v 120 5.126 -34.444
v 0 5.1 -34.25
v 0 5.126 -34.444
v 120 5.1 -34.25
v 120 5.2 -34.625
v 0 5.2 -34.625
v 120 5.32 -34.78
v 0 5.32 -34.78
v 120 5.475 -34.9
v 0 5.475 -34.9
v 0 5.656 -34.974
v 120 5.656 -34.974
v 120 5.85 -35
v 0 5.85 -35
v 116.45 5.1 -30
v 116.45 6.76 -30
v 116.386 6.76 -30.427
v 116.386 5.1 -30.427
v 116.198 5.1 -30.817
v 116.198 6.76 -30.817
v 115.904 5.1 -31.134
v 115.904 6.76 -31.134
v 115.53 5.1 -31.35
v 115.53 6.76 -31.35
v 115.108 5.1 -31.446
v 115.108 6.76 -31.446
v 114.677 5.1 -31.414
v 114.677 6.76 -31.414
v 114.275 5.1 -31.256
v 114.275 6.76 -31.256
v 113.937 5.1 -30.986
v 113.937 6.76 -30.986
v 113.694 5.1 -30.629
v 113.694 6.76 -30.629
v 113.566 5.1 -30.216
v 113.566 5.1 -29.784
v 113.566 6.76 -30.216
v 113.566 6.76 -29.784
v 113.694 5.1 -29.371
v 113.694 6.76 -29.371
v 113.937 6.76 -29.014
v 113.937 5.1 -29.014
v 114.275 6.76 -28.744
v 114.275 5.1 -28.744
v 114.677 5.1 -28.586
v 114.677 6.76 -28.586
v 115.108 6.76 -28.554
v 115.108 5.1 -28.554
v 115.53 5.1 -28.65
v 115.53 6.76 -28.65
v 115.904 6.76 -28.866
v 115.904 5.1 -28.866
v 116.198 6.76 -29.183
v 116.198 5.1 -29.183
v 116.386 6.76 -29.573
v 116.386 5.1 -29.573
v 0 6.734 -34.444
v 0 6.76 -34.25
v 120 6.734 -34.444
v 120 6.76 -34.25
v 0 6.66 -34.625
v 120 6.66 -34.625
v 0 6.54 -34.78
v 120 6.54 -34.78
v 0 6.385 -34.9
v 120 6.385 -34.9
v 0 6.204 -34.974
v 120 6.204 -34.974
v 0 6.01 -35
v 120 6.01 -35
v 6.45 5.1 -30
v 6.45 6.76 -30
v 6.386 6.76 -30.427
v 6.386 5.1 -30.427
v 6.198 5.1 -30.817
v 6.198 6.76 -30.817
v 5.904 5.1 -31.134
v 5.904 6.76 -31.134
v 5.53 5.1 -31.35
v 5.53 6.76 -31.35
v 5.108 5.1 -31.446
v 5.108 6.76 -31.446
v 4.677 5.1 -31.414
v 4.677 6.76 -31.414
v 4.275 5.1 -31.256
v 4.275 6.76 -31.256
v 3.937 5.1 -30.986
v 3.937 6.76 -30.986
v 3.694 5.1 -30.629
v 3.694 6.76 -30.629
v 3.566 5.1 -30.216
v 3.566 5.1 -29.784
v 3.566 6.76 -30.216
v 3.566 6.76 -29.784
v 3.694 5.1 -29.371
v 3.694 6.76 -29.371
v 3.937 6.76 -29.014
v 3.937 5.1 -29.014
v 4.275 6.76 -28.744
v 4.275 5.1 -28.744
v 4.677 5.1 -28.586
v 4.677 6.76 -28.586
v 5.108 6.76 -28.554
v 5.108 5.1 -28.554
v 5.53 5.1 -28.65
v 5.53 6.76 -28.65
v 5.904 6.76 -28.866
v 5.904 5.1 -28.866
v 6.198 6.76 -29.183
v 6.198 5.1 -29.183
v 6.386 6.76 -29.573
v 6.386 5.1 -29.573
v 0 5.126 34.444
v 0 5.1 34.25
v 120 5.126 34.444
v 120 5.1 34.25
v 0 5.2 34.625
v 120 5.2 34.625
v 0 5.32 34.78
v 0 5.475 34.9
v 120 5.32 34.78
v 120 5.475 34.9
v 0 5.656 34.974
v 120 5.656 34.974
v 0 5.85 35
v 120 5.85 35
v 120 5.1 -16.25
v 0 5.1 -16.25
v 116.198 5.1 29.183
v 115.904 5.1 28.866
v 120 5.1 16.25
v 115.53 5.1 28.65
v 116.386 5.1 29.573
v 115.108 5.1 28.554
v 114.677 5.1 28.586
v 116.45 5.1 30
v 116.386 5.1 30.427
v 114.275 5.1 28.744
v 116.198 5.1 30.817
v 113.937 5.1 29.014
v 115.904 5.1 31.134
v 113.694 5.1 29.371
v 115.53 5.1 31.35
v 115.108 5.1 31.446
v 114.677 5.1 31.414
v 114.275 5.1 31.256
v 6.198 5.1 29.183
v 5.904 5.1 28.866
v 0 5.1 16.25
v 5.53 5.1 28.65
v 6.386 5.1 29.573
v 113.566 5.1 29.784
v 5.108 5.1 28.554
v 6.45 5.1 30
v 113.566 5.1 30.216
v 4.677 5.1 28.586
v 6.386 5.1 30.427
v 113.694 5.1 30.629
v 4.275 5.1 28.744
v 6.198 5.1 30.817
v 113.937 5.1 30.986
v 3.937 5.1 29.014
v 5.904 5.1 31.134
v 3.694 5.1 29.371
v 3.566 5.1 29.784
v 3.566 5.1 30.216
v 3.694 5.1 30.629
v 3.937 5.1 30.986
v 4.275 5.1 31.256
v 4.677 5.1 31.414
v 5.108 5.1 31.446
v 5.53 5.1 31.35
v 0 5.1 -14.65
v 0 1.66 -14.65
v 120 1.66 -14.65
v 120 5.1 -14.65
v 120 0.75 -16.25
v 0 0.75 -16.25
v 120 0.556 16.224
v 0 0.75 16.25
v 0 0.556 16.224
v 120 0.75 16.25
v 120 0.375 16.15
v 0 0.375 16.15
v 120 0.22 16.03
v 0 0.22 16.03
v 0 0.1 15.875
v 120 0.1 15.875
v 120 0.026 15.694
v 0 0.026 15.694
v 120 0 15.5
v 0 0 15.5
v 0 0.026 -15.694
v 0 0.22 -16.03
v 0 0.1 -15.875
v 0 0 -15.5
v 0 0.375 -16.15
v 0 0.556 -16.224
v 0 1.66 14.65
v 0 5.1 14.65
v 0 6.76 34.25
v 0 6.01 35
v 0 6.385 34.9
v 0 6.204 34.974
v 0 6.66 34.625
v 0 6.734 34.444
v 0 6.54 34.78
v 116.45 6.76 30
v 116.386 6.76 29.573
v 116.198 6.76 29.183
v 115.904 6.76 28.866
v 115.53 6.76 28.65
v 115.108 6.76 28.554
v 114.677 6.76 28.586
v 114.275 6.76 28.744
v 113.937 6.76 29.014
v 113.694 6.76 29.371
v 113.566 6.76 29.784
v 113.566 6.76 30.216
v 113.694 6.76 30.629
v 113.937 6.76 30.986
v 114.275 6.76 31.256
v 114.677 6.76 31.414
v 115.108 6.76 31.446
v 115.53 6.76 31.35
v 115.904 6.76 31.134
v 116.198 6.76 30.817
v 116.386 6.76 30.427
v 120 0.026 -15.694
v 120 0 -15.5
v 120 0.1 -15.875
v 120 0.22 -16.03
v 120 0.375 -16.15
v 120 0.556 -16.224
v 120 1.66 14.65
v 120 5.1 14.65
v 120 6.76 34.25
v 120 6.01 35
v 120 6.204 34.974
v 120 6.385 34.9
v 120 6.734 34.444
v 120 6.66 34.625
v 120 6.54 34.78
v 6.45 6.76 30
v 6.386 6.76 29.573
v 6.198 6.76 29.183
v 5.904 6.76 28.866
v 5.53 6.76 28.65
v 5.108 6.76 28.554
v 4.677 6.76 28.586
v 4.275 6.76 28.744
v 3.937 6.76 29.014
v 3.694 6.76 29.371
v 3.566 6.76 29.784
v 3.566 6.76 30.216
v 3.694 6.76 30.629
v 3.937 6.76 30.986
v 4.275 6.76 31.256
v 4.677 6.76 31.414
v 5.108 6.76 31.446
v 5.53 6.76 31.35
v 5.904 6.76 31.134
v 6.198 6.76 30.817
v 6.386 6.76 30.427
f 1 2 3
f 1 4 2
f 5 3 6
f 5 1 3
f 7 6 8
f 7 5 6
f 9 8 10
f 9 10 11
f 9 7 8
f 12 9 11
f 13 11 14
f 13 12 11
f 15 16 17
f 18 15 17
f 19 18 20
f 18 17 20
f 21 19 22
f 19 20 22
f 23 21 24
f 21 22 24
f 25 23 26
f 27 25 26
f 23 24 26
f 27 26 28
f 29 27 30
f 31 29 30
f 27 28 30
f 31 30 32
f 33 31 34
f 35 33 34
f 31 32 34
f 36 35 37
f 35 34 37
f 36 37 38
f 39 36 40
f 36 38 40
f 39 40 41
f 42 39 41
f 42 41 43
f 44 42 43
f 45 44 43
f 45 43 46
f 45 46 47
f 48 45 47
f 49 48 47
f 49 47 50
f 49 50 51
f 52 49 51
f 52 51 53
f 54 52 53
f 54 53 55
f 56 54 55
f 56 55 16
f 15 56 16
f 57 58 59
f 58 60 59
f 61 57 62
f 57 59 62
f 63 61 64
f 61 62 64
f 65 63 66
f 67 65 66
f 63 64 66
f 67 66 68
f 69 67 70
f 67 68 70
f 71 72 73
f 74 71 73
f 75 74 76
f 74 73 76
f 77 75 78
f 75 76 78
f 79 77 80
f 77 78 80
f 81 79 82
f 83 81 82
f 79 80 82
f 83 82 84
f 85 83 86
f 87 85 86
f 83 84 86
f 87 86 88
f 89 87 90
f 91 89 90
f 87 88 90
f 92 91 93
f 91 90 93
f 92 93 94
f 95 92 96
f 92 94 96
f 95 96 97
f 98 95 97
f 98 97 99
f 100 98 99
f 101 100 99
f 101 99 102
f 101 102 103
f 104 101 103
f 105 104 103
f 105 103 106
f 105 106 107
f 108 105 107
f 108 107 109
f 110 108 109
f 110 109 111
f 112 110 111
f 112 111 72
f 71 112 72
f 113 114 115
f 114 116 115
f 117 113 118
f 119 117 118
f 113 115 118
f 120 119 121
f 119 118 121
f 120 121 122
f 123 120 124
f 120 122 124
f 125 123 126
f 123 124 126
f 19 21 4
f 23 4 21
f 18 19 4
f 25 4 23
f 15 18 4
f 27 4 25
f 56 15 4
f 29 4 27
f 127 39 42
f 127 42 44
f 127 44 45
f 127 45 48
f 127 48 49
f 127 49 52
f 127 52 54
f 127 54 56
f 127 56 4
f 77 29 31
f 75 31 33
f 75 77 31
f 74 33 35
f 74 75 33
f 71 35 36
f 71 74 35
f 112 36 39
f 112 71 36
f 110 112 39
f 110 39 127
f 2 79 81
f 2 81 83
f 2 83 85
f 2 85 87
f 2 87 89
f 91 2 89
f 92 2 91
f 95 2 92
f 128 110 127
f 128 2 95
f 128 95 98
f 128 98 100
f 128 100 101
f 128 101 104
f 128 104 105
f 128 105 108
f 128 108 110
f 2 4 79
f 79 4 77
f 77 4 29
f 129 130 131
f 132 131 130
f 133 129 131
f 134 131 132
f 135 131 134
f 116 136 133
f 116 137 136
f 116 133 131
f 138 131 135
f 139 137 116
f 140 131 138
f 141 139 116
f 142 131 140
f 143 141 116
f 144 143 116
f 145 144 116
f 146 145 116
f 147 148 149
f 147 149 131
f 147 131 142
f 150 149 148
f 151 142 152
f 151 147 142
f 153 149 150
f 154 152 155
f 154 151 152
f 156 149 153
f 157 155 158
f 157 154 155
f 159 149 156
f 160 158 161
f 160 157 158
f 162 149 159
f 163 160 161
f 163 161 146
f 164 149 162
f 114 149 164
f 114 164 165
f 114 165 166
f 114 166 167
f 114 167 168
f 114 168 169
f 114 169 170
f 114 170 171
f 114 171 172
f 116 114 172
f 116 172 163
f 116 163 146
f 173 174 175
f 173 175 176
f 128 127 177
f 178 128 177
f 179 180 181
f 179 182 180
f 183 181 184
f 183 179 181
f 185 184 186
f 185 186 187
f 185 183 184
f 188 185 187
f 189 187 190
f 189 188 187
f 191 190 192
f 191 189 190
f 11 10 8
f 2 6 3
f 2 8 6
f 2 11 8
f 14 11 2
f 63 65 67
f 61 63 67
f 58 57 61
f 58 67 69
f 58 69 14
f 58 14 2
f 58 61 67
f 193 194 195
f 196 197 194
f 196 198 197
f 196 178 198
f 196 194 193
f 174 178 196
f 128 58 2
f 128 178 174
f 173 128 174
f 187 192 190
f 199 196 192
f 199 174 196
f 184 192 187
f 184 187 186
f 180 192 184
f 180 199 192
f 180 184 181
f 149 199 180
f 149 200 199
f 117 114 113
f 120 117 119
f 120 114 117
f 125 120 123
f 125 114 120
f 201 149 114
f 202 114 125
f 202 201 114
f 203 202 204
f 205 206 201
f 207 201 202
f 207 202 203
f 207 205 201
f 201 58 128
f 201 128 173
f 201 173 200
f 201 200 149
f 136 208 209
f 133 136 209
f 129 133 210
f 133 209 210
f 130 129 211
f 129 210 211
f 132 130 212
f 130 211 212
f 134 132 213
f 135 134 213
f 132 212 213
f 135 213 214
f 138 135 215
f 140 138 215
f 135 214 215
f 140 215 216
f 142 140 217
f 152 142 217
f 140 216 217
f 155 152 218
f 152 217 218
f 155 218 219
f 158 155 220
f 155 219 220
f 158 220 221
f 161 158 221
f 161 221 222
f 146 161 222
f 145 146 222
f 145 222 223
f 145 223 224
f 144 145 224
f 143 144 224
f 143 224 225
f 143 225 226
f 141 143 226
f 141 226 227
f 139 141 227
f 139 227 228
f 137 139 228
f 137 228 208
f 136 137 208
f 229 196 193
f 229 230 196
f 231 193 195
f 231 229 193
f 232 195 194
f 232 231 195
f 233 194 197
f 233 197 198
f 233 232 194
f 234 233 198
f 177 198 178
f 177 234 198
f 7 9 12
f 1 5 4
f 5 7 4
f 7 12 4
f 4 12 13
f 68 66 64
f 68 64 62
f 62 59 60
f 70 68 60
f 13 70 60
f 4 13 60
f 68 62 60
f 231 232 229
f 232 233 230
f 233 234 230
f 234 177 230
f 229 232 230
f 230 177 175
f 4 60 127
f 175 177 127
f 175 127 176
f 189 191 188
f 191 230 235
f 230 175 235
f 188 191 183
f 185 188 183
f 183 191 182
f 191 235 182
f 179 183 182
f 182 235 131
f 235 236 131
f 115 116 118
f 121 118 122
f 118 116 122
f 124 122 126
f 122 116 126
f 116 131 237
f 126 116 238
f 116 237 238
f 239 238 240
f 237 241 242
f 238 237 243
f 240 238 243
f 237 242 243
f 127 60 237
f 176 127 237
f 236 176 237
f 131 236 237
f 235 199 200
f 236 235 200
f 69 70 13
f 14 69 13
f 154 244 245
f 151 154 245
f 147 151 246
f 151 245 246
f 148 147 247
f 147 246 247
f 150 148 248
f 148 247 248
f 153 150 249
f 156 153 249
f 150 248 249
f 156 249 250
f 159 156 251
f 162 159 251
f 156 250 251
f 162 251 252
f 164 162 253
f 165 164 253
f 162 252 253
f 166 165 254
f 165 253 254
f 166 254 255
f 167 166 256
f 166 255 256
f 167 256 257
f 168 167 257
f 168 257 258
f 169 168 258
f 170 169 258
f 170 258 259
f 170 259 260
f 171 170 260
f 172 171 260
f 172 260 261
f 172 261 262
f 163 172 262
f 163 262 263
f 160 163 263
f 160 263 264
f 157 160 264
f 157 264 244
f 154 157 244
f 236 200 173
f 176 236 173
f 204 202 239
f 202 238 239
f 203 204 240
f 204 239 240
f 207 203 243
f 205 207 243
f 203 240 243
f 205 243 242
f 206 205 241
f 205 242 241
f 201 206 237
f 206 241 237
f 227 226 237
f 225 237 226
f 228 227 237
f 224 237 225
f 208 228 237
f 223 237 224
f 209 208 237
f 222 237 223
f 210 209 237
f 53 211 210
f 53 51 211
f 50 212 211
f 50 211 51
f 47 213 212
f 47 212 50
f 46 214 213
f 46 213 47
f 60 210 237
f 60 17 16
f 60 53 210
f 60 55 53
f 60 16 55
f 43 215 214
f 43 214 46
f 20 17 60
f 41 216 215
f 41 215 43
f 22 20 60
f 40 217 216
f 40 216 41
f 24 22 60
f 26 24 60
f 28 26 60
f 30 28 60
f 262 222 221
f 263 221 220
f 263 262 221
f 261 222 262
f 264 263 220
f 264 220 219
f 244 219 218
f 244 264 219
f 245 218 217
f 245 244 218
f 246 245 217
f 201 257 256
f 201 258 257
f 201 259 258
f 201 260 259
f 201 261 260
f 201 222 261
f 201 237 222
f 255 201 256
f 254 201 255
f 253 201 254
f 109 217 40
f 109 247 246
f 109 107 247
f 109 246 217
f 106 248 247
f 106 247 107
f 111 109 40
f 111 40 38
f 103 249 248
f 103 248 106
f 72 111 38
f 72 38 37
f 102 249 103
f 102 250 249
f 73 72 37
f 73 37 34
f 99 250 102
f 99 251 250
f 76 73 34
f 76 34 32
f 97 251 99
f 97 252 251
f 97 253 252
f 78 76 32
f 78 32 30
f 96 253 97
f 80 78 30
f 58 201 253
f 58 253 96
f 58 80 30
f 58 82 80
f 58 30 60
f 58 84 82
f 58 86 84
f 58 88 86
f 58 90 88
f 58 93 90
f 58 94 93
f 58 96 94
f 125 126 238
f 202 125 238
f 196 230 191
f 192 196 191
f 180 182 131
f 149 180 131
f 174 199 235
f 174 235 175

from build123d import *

# Parameters (mm, degrees)
SKETCH1_W           = 29.3
SKETCH1_H           = 3.44
BOSS_EXTRUDE1_DEPTH = 120
FILLET1_R           = 0.75
CUT_EXTRUDE1_REACH  = 8.76
SKETCH2_R           = 1.45


with BuildPart() as part:
    # Sketch1 → Boss-Extrude1 (new body)
    with BuildSketch(Plane(origin=(0, 0, 0), x_dir=(0, 0, -1), z_dir=(1, 0, 0))):
        Polygon((-16.25, 0), (-16.25, 5.1), (-35, 5.1), (-35, 6.76), (35, 6.76), (35, 5.1), (16.25, 5.1), (16.25, 0), align=None)
        with Locations((0, 3.38)):
            Rectangle(SKETCH1_W, SKETCH1_H, mode=Mode.SUBTRACT)
    extrude(amount=BOSS_EXTRUDE1_DEPTH)

    # Fillet1
    fillet1_edges = [part.edges().sort_by_distance(p)[0] for p in [
        (60, 0, 16.25),
        (60, 5.1, 35),
        (60, 6.76, 35),
        (60, 6.76, -35),
        (60, 5.1, -35),
        (60, 0, -16.25),
    ]]
    fillet(fillet1_edges, radius=FILLET1_R)

    # Sketch2 → Cut-Extrude1 (cut, up to next)
    with BuildSketch(Plane(origin=(0, 6.76, 0), x_dir=(1, 0, 0), z_dir=(0, 1, 0)), mode=Mode.PRIVATE) as cut_extrude1_sk1:
        with Locations((115, 30)):
            Circle(SKETCH2_R)
    cut_extrude1_tool1 = extrude(cut_extrude1_sk1.sketch, amount=-CUT_EXTRUDE1_REACH, mode=Mode.PRIVATE) & part.part
    add(cut_extrude1_tool1.solids().sort_by_distance((115, 6.76, -30))[0], mode=Mode.SUBTRACT)
    # Sketch2 → Cut-Extrude1 (cut, up to next)
    with BuildSketch(Plane(origin=(0, 6.76, 0), x_dir=(1, 0, 0), z_dir=(0, 1, 0)), mode=Mode.PRIVATE) as cut_extrude1_sk2:
        with Locations((5, 30)):
            Circle(SKETCH2_R)
    cut_extrude1_tool2 = extrude(cut_extrude1_sk2.sketch, amount=-CUT_EXTRUDE1_REACH, mode=Mode.PRIVATE) & part.part
    add(cut_extrude1_tool2.solids().sort_by_distance((5, 6.76, -30))[0], mode=Mode.SUBTRACT)
    # Sketch2 → Cut-Extrude1 (cut, up to next)
    with BuildSketch(Plane(origin=(0, 6.76, 0), x_dir=(1, 0, 0), z_dir=(0, 1, 0)), mode=Mode.PRIVATE) as cut_extrude1_sk3:
        with Locations((5, -30)):
            Circle(SKETCH2_R)
    cut_extrude1_tool3 = extrude(cut_extrude1_sk3.sketch, amount=-CUT_EXTRUDE1_REACH, mode=Mode.PRIVATE) & part.part
    add(cut_extrude1_tool3.solids().sort_by_distance((5, 6.76, 30))[0], mode=Mode.SUBTRACT)
    # Sketch2 → Cut-Extrude1 (cut, up to next)
    with BuildSketch(Plane(origin=(0, 6.76, 0), x_dir=(1, 0, 0), z_dir=(0, 1, 0)), mode=Mode.PRIVATE) as cut_extrude1_sk4:
        with Locations((115, -30)):
            Circle(SKETCH2_R)
    cut_extrude1_tool4 = extrude(cut_extrude1_sk4.sketch, amount=-CUT_EXTRUDE1_REACH, mode=Mode.PRIVATE) & part.part
    add(cut_extrude1_tool4.solids().sort_by_distance((115, 6.76, 30))[0], mode=Mode.SUBTRACT)


solid = part.part
